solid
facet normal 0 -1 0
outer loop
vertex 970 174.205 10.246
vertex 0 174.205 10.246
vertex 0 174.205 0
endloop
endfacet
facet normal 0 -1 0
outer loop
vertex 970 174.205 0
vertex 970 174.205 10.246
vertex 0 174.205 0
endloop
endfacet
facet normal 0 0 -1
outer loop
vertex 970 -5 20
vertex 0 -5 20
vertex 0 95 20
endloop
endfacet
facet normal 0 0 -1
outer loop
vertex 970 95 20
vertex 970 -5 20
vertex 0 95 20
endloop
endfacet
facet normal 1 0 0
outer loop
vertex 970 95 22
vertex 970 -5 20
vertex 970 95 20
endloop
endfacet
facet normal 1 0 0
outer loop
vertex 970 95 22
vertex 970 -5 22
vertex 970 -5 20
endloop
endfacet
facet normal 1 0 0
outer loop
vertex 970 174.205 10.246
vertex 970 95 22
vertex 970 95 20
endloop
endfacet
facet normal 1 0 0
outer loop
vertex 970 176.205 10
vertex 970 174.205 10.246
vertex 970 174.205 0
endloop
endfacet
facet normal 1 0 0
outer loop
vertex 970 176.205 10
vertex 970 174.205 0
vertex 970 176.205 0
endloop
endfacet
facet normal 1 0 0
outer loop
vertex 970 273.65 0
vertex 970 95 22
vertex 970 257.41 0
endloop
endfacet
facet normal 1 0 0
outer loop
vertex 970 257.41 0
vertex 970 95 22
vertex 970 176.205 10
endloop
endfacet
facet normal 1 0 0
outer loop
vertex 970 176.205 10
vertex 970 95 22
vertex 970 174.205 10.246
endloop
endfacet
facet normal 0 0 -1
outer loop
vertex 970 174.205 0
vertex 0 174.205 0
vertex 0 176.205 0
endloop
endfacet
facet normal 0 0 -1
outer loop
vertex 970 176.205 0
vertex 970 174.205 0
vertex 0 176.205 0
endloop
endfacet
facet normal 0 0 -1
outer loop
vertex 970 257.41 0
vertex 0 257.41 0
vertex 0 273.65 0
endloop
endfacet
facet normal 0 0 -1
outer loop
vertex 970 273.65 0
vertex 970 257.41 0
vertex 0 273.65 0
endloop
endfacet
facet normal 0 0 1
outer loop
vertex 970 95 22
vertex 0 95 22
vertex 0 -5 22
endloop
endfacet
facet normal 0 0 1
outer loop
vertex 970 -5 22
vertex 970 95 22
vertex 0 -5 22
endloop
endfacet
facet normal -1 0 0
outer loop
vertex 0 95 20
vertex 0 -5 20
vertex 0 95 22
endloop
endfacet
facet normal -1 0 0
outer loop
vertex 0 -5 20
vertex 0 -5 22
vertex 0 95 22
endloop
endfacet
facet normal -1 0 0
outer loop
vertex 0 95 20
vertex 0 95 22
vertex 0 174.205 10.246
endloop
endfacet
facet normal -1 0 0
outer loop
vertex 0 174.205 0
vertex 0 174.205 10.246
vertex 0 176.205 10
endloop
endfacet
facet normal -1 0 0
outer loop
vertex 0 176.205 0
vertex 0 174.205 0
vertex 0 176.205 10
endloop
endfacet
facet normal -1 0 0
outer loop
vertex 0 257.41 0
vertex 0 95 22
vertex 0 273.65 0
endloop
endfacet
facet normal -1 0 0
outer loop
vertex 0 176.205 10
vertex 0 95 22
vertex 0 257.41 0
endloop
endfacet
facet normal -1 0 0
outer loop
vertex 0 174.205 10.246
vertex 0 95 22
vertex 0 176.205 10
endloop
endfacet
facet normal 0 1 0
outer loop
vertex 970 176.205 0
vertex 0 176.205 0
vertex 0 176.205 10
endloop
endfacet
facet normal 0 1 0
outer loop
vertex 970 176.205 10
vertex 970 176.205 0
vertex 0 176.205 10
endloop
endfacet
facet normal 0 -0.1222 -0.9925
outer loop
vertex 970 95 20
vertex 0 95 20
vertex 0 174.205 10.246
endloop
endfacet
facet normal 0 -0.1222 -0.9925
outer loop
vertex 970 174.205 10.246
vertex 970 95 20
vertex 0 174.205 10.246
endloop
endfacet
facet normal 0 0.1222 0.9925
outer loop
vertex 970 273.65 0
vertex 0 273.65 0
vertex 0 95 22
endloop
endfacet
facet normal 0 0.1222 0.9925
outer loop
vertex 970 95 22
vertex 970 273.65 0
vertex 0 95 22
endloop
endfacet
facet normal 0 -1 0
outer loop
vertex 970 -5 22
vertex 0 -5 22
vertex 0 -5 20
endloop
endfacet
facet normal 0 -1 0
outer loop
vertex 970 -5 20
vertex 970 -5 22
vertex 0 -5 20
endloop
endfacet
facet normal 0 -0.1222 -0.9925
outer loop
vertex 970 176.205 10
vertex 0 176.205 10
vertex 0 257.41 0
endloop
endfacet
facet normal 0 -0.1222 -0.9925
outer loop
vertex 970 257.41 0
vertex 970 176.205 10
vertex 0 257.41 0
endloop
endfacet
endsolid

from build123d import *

# Parameters (mm, degrees)
F1_DEPTH = 970
F2_W     = 35
F2_H     = 30
F3_DEPTH = 2.3
F4_W     = 2.4
F4_H     = 1
F5_DEPTH = 30.001
F7_DEPTH = 970


with BuildPart() as f1:
    # F0 (on Right) → F1 (new body)
    with BuildSketch(Plane.YZ):
        Polygon((0, 20), (0, 0), (2.3, 0), (2.3, 17.7), (27.7, 17.7), (27.7, 0), (30, 0), (30, 20), align=None)
    extrude(amount=F1_DEPTH)

    # F2 (on face) → F3 (cut)
    with BuildSketch(Plane.XY.offset(20)):
        with Locations((17.5, 15)):
            Rectangle(F2_W, F2_H)
        with Locations((952.5, 15)):
            Rectangle(F2_W, F2_H)
    extrude(amount=-F3_DEPTH, mode=Mode.SUBTRACT)

    # F4 (on face) → F5 (cut, through all)
    with BuildSketch(Plane.XZ):
        with Locations((33.8, 0.5)):
            Rectangle(F4_W, F4_H)
        with Locations((6.2, 0.5)):
            Rectangle(F4_W, F4_H)
        with Locations((936.2, 0.5)):
            Rectangle(F4_W, F4_H)
        with Locations((963.8, 0.5)):
            Rectangle(F4_W, F4_H)
    extrude(amount=-F5_DEPTH, mode=Mode.SUBTRACT)


with BuildPart() as f7:
    # F6 (on Right) → F7 (new body)
    with BuildSketch(Plane.YZ):
        Polygon((-5, 20), (95, 20), (174.204771, 10.246291), (176.204771, 10), (257.409543, 0), (273.650497, 0), (95, 22), (-5, 22), align=None)
        Polygon((176.204771, 10), (174.204771, 10.246291), (174.204771, 0), (176.204771, 0), align=None)
    extrude(amount=F7_DEPTH)


solid = f7.part
